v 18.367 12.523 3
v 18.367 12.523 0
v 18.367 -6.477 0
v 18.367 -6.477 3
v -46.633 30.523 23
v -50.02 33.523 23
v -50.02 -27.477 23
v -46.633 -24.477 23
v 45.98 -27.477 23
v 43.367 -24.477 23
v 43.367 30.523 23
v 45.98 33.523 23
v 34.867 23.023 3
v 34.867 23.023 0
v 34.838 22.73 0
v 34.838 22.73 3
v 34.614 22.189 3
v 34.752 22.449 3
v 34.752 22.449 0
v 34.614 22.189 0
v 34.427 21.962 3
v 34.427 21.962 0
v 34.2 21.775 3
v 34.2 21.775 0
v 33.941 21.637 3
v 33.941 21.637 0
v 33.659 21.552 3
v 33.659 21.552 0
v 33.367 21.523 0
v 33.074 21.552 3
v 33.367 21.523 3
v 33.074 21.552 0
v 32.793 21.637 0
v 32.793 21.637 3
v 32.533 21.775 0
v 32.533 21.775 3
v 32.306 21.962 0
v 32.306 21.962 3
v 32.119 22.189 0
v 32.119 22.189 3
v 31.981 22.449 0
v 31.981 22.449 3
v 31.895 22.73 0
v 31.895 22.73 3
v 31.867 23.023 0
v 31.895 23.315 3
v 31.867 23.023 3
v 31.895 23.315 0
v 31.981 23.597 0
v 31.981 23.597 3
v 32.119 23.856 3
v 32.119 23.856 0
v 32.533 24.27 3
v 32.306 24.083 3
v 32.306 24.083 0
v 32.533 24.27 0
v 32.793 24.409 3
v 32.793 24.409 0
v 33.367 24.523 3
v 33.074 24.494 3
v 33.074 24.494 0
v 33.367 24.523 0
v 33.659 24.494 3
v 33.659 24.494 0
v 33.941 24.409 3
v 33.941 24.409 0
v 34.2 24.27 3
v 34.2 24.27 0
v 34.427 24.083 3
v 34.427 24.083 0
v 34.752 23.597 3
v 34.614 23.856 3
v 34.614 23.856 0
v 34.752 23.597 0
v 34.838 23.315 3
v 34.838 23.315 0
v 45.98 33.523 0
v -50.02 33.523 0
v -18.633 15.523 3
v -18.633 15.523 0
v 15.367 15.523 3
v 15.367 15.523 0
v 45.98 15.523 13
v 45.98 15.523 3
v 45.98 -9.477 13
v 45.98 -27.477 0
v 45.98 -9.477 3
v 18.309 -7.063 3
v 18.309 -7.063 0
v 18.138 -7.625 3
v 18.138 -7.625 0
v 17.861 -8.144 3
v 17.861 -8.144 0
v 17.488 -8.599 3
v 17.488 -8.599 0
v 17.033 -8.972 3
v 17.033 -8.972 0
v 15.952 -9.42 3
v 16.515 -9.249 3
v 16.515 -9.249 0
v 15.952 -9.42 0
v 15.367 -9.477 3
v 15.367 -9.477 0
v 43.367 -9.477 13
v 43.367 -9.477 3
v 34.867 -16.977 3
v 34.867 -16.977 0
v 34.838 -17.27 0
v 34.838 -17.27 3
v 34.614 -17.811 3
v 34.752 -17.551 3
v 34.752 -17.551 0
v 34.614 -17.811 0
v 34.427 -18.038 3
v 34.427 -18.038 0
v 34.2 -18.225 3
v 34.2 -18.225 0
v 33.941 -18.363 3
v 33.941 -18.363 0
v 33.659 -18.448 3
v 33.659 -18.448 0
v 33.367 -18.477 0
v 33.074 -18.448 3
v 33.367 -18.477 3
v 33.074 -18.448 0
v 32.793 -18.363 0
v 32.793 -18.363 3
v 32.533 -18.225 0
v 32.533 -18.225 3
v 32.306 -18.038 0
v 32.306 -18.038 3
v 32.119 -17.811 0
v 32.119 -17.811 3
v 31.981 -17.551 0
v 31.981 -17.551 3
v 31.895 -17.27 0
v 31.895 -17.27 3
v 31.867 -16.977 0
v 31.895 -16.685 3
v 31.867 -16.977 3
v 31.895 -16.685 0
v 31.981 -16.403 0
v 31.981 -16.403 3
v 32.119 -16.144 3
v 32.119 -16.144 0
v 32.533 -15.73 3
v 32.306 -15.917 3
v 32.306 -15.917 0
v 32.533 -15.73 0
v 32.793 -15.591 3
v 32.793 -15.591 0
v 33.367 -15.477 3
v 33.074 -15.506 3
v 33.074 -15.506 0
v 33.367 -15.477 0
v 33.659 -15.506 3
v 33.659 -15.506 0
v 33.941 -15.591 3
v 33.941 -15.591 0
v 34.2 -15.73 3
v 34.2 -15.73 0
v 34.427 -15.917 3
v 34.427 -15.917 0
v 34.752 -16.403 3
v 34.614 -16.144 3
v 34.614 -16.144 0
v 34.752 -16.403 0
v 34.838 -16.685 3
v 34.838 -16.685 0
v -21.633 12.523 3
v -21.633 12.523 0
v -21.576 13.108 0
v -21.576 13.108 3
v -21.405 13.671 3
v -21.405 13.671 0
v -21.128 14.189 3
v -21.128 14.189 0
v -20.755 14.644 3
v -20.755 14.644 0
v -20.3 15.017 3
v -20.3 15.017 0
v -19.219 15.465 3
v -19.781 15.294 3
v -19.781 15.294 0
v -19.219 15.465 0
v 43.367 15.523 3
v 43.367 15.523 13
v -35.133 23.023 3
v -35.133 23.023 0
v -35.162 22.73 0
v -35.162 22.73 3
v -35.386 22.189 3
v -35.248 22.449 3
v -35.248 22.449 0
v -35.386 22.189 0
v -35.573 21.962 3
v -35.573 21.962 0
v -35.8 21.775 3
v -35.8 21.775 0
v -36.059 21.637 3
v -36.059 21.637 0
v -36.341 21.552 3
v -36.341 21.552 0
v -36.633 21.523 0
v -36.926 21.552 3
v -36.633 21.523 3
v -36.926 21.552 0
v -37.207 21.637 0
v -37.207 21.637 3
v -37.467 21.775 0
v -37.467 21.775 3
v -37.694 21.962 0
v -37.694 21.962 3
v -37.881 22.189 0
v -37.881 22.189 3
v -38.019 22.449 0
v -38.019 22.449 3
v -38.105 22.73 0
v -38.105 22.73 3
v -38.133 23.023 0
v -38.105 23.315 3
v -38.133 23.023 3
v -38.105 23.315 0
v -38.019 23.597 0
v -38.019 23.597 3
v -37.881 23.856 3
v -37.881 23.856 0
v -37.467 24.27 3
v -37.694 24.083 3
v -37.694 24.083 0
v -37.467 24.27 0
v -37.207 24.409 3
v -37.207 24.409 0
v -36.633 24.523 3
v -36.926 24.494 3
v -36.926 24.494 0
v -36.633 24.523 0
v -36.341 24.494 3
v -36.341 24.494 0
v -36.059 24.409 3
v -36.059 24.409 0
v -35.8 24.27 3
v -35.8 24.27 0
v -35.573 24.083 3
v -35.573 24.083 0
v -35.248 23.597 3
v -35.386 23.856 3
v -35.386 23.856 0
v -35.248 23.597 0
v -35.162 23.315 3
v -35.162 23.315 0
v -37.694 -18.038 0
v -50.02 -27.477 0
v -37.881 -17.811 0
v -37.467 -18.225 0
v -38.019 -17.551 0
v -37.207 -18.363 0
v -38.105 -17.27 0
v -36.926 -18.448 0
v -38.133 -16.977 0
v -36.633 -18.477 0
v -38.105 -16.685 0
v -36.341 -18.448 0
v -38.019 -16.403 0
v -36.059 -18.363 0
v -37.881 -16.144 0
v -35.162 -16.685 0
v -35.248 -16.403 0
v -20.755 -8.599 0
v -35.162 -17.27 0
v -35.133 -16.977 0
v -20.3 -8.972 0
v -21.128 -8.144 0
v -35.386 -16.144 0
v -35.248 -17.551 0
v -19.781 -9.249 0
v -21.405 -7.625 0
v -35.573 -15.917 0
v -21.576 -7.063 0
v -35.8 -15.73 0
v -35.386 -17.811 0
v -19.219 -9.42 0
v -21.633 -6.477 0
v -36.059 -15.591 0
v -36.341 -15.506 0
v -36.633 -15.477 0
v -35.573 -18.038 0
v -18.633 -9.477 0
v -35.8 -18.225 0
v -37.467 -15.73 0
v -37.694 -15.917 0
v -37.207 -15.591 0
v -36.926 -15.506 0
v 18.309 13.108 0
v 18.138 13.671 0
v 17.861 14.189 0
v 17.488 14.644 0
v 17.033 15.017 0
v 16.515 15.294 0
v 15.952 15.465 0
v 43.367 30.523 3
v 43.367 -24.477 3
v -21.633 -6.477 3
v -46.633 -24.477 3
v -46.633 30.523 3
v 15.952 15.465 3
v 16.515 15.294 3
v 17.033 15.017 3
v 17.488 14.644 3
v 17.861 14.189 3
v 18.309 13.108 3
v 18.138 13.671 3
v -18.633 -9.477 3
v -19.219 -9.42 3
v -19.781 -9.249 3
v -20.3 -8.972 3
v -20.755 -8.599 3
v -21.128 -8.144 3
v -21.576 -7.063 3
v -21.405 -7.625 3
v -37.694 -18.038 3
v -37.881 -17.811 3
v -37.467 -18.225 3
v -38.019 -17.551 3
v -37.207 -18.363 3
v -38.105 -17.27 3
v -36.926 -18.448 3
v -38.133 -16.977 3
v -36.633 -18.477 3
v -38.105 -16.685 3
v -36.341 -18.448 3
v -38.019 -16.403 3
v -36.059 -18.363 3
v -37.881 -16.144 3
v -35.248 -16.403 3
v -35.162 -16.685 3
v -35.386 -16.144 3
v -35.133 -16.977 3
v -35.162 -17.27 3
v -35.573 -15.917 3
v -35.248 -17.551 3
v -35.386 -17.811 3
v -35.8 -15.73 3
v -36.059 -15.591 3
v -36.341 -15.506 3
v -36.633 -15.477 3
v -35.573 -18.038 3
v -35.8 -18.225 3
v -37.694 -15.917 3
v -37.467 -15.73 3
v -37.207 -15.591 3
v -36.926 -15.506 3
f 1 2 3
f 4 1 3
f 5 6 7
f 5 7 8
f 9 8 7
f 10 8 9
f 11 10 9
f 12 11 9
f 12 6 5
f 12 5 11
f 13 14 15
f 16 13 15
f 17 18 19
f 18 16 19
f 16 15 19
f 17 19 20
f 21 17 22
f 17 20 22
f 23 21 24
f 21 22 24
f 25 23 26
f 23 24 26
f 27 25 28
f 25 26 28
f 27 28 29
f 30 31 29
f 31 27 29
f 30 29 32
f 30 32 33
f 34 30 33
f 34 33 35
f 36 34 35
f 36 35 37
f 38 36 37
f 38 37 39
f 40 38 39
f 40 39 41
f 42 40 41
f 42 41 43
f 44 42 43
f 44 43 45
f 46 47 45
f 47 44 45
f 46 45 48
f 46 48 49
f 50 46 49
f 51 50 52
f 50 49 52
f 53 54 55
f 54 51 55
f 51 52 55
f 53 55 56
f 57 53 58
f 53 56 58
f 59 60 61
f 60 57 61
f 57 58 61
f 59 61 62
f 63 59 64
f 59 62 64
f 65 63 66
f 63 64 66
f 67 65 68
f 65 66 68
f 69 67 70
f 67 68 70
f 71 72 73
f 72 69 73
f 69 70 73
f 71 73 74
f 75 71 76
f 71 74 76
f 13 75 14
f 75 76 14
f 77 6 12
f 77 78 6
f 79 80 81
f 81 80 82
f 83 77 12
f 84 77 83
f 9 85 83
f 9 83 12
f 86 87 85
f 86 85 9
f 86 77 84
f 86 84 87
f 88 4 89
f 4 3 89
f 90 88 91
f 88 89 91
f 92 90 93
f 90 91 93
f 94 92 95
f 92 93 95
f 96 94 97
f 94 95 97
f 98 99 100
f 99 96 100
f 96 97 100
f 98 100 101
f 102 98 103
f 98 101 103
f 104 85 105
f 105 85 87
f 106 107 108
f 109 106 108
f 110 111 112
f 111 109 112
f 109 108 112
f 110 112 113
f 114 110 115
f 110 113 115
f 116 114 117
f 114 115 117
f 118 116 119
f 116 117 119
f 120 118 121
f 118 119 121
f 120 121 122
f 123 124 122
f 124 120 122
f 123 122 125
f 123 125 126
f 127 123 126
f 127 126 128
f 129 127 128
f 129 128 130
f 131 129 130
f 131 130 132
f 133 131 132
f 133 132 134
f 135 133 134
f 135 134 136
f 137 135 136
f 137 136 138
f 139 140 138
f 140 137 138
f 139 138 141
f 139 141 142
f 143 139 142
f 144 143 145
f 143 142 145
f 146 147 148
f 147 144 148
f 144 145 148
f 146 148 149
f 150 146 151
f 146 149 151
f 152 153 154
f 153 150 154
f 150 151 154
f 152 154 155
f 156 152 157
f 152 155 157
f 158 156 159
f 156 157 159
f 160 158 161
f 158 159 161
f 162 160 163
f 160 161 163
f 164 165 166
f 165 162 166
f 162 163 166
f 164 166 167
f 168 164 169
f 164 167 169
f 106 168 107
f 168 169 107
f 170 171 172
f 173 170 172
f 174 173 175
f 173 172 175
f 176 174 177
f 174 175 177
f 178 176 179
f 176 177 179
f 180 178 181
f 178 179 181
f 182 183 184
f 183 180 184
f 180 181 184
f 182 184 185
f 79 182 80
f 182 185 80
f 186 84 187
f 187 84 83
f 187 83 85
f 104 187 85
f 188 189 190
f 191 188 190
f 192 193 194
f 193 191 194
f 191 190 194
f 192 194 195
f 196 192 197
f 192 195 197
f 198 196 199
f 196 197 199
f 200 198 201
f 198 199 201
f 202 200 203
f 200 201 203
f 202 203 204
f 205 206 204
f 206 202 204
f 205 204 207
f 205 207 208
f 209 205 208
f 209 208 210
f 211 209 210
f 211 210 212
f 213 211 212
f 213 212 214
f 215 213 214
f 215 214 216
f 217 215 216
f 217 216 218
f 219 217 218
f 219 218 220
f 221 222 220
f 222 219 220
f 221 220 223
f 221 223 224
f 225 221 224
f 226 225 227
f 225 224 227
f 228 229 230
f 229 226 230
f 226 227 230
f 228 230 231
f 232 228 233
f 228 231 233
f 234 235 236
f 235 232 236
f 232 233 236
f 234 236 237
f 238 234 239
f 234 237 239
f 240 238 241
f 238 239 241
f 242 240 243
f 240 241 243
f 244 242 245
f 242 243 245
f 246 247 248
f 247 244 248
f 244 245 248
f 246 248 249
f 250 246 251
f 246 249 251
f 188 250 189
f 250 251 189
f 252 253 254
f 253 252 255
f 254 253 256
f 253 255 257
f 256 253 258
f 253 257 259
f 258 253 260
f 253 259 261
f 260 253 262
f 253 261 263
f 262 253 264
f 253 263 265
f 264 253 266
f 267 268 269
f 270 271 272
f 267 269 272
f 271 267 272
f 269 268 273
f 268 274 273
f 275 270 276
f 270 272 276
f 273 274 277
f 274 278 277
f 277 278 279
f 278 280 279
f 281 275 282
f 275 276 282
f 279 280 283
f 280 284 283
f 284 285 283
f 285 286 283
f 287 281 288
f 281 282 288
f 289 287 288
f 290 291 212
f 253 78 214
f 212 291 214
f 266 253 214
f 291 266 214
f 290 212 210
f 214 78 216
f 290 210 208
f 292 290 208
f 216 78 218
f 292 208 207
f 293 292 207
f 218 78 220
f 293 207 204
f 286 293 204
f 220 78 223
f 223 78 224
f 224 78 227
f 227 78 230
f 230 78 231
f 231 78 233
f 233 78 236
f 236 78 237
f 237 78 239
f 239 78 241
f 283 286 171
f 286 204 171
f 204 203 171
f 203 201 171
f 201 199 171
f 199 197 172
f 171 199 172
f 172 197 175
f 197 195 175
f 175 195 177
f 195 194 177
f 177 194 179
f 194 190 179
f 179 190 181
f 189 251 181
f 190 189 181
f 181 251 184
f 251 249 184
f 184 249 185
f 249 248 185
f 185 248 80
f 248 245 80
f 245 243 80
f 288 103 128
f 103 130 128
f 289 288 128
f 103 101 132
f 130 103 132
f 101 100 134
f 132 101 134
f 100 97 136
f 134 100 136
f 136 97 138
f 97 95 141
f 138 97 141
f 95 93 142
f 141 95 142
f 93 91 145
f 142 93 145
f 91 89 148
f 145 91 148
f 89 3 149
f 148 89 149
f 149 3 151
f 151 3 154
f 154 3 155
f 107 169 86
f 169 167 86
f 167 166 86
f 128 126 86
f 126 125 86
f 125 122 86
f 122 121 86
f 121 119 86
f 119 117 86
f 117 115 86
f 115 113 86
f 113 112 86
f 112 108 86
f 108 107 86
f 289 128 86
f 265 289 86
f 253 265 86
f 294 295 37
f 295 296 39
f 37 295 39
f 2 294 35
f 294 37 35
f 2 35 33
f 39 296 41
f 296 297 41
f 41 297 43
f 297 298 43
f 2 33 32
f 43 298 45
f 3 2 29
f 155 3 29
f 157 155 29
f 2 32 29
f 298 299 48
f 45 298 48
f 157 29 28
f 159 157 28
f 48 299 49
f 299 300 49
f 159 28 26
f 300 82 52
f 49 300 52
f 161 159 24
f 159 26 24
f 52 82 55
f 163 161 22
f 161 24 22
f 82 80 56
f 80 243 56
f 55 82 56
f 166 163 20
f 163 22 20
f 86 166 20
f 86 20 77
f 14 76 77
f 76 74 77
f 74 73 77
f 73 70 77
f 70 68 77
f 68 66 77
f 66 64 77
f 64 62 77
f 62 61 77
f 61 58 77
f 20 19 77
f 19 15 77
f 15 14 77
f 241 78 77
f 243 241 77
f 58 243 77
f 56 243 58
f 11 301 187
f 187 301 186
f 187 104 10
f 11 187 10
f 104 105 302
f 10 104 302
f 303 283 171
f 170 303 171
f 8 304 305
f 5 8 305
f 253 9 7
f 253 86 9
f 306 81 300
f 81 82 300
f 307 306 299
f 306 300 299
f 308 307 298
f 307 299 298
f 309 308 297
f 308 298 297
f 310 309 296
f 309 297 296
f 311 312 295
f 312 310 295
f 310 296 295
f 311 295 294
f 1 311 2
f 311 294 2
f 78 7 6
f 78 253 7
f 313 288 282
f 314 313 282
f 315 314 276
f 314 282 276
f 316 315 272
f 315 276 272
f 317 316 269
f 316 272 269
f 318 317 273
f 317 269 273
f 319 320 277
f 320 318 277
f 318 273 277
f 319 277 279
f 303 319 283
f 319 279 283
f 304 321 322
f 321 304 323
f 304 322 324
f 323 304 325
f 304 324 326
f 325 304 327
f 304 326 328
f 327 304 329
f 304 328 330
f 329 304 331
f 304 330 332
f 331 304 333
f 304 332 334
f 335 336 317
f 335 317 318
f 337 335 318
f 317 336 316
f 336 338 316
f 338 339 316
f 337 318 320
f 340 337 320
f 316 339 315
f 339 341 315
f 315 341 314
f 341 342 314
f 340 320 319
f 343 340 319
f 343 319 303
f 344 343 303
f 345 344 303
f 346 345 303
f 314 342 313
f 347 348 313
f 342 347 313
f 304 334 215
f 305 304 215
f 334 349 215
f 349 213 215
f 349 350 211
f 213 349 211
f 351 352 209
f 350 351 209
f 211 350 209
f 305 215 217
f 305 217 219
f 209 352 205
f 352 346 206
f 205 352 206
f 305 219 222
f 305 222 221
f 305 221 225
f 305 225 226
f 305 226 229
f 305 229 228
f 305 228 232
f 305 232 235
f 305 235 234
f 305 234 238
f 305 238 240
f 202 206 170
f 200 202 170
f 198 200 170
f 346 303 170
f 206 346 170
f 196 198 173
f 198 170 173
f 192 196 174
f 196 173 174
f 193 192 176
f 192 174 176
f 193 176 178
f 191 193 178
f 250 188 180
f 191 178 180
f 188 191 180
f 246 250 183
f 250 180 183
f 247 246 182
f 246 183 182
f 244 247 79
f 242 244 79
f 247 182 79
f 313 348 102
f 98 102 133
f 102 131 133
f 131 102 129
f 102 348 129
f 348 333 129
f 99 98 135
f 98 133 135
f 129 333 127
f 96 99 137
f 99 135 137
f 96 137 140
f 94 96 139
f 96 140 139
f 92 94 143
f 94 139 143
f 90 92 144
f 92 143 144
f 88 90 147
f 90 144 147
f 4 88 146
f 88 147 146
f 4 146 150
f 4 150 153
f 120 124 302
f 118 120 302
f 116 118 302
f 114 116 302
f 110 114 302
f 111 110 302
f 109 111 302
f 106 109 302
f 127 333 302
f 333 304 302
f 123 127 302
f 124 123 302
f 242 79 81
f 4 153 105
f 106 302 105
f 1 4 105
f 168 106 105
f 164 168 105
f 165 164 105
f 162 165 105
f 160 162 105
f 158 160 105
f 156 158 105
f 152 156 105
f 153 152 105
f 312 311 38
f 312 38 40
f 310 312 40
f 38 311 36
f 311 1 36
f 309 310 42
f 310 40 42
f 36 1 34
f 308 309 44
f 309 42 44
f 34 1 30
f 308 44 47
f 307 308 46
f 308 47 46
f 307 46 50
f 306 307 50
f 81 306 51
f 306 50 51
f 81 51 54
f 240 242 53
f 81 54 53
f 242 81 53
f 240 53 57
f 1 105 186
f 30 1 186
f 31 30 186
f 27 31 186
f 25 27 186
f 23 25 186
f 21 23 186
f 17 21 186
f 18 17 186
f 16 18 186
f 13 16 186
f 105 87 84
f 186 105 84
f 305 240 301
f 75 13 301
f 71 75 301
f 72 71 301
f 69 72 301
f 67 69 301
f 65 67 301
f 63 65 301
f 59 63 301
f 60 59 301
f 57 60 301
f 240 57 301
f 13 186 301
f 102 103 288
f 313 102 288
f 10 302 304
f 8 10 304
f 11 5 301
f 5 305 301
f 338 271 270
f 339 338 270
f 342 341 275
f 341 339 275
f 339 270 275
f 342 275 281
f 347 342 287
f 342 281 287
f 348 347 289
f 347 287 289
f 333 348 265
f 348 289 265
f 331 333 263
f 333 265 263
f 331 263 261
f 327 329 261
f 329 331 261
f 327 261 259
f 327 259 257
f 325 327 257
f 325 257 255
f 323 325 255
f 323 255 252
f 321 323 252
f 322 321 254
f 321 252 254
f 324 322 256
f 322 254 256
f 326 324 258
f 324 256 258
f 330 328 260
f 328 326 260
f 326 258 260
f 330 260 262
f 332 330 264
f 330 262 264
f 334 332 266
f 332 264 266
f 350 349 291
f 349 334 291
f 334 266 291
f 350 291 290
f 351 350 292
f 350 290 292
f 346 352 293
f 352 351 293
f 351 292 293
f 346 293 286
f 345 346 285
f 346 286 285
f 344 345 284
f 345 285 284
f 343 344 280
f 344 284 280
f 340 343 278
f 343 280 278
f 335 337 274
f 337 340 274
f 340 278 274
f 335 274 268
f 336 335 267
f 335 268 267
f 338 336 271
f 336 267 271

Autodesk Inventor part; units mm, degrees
ref_plane "YZ Plane" through (0, 0, 0) normal (1, 0, 0) x (0, 1, 0)
ref_plane "XZ Plane" through (0, 0, 0) normal (0, 1, 0) x (-1, 0, 0)
ref_plane "XY Plane" through (0, 0, 0) normal (0, 0, 1) x (1, 0, 0)
sketch "Sketch1" plane through (0, 0, 0) normal (0, 0, 1) x (1, 0, 0)
  line L0 (-50.0201, 33.5227) -> (45.9799, 33.5227)
  line L1 (45.9799, 33.5227) -> (45.9799, -27.4773)
  line L2 (45.9799, -27.4773) -> (-50.0201, -27.4773)
  line L3 (-50.0201, -27.4773) -> (-50.0201, 33.5227)
  line L4 (-50.0201, 33.5227) -> (-50.0201, 30.5227)
  line L5 (-46.6334, 30.5227) -> (43.3666, 30.5227)
  line L6 (43.3666, 30.5227) -> (43.3666, -24.4773)
  line L7 (43.3666, -24.4773) -> (-46.6334, -24.4773)
  line L8 (-46.6334, -24.4773) -> (-46.6334, 30.5227)
  circle A0 centre (-36.6334, 23.0227) radius 1.5
  circle A1 centre (33.3666, 23.0227) radius 1.5
  circle A2 centre (-36.6334, -16.9773) radius 1.5
  circle A3 centre (33.3666, -16.9773) radius 1.5
  line L9 (-18.6334, 15.5227) -> (15.3666, 15.5227)
  line L10 (18.3666, 12.5227) -> (18.3666, -6.4773)
  line L11 (15.3666, -9.4773) -> (-18.6334, -9.4773)
  line L12 (-21.6334, -6.4773) -> (-21.6334, 12.5227)
  arc A4 (-18.6334, 15.5227) -> (-21.6334, 12.5227) centre (-18.6334, 12.5227) ccw
  arc A5 (18.3666, 12.5227) -> (15.3666, 15.5227) centre (15.3666, 12.5227) ccw
  arc A6 (15.3666, -9.4773) -> (18.3666, -6.4773) centre (15.3666, -6.4773) ccw
  arc A7 (-21.6334, -6.4773) -> (-18.6334, -9.4773) centre (-18.6334, -6.4773) ccw
  point P0 (0, 0)
  dimension "d0" = 96
  dimension "d1" = 61
  dimension "d4" = 90
  dimension "d5" = 55
  dimension "d6" = 3
  dimension "d14" = 3
  dimension "d17" = 3
  dimension "d20" = 3
  dimension "d22" = 3
  dimension "d24" = 25
  dimension "d25" = 25
  dimension "d26" = 15
  dimension "d27" = 15
  dimension "d28" = 3
extrude "Extrusion2" add sketch "Sketch1" along normal blind 23 contours L0 L1 L2 L3
extrude "Extrusion3" add sketch "Sketch1" along normal blind 3 contours L5 L6 L7 L8
sketch "Sketch2" plane through (45.9799, -27.4773, 0) normal (1, 0, 0) x (0, 0, -1)
  line L0 (0, 0) -> (-23, 0) projected
  line L1 (0, 0) -> (0, 61) projected
  line L2 (-13, 18) -> (-3, 18)
  line L3 (-3, 18) -> (-3, 43)
  line L4 (-3, 43) -> (-13, 43)
  line L5 (-13, 43) -> (-13, 18)
  point P0 (0, 27.4773)
  dimension "d33" = 10
  dimension "d34" = 25
  dimension "d35" = 3
  dimension "d36" = 18
extrude "Extrusion4" cut sketch "Sketch2" against normal blind 3
properties part number "layer line sensor"
